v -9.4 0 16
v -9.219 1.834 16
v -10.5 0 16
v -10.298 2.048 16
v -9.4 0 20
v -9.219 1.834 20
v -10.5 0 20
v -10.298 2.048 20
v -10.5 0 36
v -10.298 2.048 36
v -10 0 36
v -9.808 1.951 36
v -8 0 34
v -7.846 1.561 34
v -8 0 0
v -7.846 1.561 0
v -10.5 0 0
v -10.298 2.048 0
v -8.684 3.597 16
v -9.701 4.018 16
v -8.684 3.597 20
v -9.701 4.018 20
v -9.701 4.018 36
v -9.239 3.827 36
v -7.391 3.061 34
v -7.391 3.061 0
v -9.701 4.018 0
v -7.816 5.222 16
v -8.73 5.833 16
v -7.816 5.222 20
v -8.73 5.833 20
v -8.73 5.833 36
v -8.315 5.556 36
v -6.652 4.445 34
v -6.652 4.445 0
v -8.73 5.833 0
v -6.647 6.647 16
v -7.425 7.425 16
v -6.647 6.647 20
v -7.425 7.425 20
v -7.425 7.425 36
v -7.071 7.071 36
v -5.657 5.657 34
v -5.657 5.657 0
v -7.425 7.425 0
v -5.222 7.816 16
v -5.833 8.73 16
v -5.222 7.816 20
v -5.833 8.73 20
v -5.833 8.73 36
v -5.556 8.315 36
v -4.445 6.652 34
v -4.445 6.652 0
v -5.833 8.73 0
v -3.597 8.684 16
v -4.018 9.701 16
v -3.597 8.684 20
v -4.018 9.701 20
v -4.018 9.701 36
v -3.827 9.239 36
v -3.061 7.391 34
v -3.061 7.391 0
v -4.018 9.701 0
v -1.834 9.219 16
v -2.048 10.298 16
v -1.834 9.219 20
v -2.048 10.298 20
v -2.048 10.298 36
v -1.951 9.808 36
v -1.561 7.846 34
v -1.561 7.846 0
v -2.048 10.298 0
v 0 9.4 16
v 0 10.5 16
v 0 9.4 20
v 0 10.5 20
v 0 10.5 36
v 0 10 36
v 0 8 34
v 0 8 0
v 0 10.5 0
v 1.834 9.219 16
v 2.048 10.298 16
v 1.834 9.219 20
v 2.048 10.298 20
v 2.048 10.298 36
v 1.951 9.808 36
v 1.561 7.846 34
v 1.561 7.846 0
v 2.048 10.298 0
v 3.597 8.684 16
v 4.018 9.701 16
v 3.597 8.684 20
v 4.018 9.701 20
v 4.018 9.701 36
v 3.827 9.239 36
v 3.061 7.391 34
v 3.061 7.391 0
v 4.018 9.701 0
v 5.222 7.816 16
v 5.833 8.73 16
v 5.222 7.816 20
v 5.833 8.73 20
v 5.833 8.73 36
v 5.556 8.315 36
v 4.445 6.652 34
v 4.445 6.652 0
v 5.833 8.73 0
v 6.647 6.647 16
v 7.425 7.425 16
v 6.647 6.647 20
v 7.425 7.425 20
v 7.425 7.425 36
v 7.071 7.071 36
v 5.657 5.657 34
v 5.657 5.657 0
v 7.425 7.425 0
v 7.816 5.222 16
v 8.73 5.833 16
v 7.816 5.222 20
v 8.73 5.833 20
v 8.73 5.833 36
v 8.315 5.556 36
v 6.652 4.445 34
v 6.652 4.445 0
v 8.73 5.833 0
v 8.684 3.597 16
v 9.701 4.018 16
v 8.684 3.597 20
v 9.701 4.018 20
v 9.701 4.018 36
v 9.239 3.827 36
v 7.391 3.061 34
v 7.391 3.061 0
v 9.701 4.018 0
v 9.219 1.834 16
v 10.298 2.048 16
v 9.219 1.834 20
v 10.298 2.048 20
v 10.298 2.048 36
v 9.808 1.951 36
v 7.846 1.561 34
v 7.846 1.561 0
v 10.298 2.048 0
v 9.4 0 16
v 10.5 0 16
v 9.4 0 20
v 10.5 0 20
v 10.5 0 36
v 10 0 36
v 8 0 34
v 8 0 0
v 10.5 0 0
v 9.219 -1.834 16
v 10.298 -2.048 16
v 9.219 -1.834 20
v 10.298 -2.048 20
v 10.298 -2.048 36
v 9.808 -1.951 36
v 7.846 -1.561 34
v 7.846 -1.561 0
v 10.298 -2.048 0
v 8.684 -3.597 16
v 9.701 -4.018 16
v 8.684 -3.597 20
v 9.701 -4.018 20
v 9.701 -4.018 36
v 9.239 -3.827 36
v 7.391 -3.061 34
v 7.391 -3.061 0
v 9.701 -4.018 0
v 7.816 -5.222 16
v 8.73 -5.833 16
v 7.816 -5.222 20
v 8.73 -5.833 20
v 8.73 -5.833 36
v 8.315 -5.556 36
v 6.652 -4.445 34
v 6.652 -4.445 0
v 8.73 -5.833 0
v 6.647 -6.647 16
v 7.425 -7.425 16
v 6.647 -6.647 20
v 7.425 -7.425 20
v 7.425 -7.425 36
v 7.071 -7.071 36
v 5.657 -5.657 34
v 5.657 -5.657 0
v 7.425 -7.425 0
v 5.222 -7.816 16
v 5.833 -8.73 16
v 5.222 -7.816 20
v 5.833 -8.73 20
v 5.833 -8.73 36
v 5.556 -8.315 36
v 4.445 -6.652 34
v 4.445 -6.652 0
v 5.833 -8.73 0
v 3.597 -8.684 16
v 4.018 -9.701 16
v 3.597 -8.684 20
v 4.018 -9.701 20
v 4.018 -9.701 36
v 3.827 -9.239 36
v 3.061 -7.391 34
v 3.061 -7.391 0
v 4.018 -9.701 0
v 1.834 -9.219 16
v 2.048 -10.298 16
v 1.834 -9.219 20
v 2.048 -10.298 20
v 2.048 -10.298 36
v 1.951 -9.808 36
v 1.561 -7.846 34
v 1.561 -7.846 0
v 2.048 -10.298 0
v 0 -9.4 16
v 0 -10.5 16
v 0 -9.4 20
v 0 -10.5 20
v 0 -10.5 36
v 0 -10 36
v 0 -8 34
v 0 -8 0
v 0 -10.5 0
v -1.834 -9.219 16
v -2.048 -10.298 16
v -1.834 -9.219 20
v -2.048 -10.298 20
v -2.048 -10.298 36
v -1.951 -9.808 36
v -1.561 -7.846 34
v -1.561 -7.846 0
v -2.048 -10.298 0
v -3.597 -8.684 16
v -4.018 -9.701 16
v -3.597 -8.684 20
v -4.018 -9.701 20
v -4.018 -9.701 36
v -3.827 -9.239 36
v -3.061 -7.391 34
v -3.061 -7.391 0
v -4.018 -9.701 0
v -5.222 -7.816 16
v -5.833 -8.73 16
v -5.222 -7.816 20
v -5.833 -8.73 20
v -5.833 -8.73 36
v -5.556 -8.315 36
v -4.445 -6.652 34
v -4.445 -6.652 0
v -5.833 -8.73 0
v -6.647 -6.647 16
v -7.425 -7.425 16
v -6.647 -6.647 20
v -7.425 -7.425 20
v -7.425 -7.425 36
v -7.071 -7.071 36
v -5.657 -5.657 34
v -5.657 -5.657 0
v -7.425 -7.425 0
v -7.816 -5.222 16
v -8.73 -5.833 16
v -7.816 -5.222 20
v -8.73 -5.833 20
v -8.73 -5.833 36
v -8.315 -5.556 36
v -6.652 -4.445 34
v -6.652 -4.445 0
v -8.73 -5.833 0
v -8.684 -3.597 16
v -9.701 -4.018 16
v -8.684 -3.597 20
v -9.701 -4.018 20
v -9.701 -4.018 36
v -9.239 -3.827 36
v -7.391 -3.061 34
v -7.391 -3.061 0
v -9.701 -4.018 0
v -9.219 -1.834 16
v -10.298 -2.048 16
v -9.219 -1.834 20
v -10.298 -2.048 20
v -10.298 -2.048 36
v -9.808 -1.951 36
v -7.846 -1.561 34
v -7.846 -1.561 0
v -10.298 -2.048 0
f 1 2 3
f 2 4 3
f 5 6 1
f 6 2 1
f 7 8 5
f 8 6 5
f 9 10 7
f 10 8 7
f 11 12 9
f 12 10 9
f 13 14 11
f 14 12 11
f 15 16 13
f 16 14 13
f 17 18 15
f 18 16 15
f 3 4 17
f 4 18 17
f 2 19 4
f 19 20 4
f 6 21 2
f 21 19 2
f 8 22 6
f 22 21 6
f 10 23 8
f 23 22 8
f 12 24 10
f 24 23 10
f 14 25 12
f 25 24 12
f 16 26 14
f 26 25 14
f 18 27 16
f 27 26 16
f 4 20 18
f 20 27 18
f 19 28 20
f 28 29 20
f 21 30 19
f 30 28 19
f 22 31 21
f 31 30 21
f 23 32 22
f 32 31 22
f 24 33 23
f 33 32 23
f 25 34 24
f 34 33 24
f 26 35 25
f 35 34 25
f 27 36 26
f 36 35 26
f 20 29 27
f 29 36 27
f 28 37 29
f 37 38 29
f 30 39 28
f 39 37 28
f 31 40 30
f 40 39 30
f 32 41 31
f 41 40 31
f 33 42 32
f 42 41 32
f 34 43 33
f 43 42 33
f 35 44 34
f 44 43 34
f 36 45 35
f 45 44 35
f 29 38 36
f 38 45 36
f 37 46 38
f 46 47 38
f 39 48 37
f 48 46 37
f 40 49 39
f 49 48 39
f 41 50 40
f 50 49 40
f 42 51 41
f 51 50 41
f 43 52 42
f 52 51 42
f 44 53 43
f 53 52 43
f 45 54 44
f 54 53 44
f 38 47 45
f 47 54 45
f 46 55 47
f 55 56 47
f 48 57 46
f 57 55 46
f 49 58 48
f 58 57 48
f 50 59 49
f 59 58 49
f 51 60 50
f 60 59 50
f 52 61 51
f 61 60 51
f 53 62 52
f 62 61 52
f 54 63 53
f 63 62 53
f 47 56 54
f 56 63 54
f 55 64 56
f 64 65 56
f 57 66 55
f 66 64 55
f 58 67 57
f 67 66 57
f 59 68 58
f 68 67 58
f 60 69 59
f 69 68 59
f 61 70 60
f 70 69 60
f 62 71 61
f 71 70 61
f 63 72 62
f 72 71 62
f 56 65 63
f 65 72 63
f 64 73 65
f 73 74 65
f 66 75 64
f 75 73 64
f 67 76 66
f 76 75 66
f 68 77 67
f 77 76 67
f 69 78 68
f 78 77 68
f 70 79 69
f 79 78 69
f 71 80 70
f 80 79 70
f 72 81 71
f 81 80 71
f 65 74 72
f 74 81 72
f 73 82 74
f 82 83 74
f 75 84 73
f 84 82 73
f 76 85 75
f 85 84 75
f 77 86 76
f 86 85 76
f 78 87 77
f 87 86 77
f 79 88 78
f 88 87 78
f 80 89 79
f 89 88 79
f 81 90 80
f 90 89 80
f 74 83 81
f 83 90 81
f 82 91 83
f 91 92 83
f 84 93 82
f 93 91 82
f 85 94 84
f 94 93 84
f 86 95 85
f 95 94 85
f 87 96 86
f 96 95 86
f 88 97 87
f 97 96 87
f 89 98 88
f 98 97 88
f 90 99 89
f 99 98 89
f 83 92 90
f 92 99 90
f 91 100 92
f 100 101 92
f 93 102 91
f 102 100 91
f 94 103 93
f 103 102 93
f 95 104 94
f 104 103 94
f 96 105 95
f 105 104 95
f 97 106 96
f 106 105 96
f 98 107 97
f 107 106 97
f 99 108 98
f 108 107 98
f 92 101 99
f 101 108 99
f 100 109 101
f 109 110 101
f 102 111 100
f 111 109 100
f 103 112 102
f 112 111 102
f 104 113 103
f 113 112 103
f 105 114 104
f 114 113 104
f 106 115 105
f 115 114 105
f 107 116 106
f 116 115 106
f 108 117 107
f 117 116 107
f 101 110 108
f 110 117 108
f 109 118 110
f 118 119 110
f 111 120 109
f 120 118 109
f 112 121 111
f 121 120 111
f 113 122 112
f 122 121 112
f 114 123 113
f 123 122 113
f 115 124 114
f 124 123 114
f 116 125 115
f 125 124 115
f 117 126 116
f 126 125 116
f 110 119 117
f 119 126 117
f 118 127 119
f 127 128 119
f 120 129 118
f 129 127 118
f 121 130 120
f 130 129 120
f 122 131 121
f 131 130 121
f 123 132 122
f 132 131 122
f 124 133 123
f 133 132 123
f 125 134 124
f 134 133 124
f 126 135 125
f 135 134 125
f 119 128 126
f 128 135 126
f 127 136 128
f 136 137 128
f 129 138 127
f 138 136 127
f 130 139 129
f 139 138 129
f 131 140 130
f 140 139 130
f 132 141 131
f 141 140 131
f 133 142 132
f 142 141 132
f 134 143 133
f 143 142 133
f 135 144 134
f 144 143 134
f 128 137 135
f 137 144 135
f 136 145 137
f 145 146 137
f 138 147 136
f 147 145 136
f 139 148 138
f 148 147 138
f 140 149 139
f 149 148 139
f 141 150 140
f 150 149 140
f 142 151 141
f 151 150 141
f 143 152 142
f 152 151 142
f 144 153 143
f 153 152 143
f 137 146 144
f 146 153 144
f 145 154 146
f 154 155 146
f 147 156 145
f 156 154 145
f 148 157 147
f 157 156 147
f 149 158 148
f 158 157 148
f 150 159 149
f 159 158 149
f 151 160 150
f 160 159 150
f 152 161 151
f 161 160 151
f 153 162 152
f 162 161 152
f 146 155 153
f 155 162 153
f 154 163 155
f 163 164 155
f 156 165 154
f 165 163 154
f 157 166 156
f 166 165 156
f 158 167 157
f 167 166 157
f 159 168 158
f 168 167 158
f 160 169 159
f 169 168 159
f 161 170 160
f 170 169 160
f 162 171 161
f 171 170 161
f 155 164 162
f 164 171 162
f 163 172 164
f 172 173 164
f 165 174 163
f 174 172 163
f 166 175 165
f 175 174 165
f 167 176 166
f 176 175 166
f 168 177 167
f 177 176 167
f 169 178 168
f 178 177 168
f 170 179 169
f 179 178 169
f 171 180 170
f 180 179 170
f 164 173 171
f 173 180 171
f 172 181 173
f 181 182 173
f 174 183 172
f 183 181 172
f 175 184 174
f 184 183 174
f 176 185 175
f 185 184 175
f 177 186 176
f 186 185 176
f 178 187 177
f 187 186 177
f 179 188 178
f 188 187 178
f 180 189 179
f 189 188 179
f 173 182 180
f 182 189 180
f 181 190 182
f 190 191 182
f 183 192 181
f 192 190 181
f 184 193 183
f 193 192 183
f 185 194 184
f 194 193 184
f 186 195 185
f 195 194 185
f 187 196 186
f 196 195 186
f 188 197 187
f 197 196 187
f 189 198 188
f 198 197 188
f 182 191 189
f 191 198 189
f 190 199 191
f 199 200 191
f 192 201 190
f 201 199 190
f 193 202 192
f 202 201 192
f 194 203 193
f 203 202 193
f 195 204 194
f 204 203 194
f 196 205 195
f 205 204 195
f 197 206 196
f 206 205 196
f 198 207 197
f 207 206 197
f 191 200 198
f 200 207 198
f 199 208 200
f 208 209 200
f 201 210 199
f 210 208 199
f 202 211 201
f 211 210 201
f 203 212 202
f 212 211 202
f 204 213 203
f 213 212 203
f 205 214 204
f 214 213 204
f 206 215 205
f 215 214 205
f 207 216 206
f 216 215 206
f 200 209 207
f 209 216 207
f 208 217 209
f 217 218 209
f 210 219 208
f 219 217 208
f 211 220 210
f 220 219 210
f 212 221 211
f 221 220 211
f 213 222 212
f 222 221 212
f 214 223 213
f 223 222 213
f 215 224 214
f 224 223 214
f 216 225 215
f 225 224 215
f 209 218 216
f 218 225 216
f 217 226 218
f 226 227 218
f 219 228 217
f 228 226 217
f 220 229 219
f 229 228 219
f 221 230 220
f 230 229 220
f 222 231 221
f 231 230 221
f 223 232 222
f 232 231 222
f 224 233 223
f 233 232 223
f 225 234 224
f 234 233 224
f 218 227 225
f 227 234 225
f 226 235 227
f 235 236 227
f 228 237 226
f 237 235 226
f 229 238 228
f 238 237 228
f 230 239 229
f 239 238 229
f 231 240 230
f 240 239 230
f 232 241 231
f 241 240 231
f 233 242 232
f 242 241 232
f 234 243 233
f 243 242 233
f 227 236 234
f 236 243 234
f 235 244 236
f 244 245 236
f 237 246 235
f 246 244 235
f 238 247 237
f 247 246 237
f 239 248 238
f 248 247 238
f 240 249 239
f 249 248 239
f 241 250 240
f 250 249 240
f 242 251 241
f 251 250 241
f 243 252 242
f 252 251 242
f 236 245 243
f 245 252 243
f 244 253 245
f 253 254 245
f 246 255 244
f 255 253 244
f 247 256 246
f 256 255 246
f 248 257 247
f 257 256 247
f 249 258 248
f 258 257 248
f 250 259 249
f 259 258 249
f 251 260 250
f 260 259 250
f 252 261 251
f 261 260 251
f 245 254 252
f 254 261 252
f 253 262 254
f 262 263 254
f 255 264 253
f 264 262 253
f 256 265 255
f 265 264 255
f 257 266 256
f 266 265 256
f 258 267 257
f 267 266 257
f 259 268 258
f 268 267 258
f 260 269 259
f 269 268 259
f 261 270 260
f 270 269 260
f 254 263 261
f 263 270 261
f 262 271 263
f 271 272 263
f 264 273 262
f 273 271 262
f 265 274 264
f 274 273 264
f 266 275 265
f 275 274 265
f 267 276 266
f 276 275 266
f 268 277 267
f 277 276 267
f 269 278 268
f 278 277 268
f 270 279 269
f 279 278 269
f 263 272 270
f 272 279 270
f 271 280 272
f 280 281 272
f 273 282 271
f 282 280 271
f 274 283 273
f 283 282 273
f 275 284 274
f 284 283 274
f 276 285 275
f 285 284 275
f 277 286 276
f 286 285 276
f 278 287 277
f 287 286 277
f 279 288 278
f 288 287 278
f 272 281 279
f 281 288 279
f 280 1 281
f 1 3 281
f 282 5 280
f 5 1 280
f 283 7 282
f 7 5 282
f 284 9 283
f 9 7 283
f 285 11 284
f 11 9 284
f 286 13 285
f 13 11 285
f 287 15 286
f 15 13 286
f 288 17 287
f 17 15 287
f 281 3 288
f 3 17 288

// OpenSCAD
$fn = 32;

// ----------------------------------------------------------------------
// Grooved revolve: thread_relief, bore R8
// ----------------------------------------------------------------------

// --- parameters (mm) ---
bore_r = 8;               // bore radius
outer_r = 10.5;           // outer radius of the body
total_h = 36;             // overall height, Z
wall = 2.5;               // radial wall thickness
groove_w = 4;             // groove width
groove_d = 1.1;           // groove depth
grooves = 1;              // number of outer grooves
relief = 2;               // thread relief leg at the bore mouth
relief_angle = 45;        // thread relief chamfer angle, degrees

bbox_x = 2 * outer_r;  // full diameter
bore_d = 2 * bore_r;  // bore diameter
body_d = 2 * outer_r;  // body diameter
revolve_angle = 360;  // full turn around the Z axis

profile = [[8, 0], [10.5, 0], [10.5, 16], [9.4, 16], [9.4, 20], [10.5, 20], [10.5, 36], [10, 36], [8, 34]];  // primary outline, 9 points, counter clockwise

// --- the one profile operation ---
rotate_extrude(angle = revolve_angle) polygon(points = profile);
